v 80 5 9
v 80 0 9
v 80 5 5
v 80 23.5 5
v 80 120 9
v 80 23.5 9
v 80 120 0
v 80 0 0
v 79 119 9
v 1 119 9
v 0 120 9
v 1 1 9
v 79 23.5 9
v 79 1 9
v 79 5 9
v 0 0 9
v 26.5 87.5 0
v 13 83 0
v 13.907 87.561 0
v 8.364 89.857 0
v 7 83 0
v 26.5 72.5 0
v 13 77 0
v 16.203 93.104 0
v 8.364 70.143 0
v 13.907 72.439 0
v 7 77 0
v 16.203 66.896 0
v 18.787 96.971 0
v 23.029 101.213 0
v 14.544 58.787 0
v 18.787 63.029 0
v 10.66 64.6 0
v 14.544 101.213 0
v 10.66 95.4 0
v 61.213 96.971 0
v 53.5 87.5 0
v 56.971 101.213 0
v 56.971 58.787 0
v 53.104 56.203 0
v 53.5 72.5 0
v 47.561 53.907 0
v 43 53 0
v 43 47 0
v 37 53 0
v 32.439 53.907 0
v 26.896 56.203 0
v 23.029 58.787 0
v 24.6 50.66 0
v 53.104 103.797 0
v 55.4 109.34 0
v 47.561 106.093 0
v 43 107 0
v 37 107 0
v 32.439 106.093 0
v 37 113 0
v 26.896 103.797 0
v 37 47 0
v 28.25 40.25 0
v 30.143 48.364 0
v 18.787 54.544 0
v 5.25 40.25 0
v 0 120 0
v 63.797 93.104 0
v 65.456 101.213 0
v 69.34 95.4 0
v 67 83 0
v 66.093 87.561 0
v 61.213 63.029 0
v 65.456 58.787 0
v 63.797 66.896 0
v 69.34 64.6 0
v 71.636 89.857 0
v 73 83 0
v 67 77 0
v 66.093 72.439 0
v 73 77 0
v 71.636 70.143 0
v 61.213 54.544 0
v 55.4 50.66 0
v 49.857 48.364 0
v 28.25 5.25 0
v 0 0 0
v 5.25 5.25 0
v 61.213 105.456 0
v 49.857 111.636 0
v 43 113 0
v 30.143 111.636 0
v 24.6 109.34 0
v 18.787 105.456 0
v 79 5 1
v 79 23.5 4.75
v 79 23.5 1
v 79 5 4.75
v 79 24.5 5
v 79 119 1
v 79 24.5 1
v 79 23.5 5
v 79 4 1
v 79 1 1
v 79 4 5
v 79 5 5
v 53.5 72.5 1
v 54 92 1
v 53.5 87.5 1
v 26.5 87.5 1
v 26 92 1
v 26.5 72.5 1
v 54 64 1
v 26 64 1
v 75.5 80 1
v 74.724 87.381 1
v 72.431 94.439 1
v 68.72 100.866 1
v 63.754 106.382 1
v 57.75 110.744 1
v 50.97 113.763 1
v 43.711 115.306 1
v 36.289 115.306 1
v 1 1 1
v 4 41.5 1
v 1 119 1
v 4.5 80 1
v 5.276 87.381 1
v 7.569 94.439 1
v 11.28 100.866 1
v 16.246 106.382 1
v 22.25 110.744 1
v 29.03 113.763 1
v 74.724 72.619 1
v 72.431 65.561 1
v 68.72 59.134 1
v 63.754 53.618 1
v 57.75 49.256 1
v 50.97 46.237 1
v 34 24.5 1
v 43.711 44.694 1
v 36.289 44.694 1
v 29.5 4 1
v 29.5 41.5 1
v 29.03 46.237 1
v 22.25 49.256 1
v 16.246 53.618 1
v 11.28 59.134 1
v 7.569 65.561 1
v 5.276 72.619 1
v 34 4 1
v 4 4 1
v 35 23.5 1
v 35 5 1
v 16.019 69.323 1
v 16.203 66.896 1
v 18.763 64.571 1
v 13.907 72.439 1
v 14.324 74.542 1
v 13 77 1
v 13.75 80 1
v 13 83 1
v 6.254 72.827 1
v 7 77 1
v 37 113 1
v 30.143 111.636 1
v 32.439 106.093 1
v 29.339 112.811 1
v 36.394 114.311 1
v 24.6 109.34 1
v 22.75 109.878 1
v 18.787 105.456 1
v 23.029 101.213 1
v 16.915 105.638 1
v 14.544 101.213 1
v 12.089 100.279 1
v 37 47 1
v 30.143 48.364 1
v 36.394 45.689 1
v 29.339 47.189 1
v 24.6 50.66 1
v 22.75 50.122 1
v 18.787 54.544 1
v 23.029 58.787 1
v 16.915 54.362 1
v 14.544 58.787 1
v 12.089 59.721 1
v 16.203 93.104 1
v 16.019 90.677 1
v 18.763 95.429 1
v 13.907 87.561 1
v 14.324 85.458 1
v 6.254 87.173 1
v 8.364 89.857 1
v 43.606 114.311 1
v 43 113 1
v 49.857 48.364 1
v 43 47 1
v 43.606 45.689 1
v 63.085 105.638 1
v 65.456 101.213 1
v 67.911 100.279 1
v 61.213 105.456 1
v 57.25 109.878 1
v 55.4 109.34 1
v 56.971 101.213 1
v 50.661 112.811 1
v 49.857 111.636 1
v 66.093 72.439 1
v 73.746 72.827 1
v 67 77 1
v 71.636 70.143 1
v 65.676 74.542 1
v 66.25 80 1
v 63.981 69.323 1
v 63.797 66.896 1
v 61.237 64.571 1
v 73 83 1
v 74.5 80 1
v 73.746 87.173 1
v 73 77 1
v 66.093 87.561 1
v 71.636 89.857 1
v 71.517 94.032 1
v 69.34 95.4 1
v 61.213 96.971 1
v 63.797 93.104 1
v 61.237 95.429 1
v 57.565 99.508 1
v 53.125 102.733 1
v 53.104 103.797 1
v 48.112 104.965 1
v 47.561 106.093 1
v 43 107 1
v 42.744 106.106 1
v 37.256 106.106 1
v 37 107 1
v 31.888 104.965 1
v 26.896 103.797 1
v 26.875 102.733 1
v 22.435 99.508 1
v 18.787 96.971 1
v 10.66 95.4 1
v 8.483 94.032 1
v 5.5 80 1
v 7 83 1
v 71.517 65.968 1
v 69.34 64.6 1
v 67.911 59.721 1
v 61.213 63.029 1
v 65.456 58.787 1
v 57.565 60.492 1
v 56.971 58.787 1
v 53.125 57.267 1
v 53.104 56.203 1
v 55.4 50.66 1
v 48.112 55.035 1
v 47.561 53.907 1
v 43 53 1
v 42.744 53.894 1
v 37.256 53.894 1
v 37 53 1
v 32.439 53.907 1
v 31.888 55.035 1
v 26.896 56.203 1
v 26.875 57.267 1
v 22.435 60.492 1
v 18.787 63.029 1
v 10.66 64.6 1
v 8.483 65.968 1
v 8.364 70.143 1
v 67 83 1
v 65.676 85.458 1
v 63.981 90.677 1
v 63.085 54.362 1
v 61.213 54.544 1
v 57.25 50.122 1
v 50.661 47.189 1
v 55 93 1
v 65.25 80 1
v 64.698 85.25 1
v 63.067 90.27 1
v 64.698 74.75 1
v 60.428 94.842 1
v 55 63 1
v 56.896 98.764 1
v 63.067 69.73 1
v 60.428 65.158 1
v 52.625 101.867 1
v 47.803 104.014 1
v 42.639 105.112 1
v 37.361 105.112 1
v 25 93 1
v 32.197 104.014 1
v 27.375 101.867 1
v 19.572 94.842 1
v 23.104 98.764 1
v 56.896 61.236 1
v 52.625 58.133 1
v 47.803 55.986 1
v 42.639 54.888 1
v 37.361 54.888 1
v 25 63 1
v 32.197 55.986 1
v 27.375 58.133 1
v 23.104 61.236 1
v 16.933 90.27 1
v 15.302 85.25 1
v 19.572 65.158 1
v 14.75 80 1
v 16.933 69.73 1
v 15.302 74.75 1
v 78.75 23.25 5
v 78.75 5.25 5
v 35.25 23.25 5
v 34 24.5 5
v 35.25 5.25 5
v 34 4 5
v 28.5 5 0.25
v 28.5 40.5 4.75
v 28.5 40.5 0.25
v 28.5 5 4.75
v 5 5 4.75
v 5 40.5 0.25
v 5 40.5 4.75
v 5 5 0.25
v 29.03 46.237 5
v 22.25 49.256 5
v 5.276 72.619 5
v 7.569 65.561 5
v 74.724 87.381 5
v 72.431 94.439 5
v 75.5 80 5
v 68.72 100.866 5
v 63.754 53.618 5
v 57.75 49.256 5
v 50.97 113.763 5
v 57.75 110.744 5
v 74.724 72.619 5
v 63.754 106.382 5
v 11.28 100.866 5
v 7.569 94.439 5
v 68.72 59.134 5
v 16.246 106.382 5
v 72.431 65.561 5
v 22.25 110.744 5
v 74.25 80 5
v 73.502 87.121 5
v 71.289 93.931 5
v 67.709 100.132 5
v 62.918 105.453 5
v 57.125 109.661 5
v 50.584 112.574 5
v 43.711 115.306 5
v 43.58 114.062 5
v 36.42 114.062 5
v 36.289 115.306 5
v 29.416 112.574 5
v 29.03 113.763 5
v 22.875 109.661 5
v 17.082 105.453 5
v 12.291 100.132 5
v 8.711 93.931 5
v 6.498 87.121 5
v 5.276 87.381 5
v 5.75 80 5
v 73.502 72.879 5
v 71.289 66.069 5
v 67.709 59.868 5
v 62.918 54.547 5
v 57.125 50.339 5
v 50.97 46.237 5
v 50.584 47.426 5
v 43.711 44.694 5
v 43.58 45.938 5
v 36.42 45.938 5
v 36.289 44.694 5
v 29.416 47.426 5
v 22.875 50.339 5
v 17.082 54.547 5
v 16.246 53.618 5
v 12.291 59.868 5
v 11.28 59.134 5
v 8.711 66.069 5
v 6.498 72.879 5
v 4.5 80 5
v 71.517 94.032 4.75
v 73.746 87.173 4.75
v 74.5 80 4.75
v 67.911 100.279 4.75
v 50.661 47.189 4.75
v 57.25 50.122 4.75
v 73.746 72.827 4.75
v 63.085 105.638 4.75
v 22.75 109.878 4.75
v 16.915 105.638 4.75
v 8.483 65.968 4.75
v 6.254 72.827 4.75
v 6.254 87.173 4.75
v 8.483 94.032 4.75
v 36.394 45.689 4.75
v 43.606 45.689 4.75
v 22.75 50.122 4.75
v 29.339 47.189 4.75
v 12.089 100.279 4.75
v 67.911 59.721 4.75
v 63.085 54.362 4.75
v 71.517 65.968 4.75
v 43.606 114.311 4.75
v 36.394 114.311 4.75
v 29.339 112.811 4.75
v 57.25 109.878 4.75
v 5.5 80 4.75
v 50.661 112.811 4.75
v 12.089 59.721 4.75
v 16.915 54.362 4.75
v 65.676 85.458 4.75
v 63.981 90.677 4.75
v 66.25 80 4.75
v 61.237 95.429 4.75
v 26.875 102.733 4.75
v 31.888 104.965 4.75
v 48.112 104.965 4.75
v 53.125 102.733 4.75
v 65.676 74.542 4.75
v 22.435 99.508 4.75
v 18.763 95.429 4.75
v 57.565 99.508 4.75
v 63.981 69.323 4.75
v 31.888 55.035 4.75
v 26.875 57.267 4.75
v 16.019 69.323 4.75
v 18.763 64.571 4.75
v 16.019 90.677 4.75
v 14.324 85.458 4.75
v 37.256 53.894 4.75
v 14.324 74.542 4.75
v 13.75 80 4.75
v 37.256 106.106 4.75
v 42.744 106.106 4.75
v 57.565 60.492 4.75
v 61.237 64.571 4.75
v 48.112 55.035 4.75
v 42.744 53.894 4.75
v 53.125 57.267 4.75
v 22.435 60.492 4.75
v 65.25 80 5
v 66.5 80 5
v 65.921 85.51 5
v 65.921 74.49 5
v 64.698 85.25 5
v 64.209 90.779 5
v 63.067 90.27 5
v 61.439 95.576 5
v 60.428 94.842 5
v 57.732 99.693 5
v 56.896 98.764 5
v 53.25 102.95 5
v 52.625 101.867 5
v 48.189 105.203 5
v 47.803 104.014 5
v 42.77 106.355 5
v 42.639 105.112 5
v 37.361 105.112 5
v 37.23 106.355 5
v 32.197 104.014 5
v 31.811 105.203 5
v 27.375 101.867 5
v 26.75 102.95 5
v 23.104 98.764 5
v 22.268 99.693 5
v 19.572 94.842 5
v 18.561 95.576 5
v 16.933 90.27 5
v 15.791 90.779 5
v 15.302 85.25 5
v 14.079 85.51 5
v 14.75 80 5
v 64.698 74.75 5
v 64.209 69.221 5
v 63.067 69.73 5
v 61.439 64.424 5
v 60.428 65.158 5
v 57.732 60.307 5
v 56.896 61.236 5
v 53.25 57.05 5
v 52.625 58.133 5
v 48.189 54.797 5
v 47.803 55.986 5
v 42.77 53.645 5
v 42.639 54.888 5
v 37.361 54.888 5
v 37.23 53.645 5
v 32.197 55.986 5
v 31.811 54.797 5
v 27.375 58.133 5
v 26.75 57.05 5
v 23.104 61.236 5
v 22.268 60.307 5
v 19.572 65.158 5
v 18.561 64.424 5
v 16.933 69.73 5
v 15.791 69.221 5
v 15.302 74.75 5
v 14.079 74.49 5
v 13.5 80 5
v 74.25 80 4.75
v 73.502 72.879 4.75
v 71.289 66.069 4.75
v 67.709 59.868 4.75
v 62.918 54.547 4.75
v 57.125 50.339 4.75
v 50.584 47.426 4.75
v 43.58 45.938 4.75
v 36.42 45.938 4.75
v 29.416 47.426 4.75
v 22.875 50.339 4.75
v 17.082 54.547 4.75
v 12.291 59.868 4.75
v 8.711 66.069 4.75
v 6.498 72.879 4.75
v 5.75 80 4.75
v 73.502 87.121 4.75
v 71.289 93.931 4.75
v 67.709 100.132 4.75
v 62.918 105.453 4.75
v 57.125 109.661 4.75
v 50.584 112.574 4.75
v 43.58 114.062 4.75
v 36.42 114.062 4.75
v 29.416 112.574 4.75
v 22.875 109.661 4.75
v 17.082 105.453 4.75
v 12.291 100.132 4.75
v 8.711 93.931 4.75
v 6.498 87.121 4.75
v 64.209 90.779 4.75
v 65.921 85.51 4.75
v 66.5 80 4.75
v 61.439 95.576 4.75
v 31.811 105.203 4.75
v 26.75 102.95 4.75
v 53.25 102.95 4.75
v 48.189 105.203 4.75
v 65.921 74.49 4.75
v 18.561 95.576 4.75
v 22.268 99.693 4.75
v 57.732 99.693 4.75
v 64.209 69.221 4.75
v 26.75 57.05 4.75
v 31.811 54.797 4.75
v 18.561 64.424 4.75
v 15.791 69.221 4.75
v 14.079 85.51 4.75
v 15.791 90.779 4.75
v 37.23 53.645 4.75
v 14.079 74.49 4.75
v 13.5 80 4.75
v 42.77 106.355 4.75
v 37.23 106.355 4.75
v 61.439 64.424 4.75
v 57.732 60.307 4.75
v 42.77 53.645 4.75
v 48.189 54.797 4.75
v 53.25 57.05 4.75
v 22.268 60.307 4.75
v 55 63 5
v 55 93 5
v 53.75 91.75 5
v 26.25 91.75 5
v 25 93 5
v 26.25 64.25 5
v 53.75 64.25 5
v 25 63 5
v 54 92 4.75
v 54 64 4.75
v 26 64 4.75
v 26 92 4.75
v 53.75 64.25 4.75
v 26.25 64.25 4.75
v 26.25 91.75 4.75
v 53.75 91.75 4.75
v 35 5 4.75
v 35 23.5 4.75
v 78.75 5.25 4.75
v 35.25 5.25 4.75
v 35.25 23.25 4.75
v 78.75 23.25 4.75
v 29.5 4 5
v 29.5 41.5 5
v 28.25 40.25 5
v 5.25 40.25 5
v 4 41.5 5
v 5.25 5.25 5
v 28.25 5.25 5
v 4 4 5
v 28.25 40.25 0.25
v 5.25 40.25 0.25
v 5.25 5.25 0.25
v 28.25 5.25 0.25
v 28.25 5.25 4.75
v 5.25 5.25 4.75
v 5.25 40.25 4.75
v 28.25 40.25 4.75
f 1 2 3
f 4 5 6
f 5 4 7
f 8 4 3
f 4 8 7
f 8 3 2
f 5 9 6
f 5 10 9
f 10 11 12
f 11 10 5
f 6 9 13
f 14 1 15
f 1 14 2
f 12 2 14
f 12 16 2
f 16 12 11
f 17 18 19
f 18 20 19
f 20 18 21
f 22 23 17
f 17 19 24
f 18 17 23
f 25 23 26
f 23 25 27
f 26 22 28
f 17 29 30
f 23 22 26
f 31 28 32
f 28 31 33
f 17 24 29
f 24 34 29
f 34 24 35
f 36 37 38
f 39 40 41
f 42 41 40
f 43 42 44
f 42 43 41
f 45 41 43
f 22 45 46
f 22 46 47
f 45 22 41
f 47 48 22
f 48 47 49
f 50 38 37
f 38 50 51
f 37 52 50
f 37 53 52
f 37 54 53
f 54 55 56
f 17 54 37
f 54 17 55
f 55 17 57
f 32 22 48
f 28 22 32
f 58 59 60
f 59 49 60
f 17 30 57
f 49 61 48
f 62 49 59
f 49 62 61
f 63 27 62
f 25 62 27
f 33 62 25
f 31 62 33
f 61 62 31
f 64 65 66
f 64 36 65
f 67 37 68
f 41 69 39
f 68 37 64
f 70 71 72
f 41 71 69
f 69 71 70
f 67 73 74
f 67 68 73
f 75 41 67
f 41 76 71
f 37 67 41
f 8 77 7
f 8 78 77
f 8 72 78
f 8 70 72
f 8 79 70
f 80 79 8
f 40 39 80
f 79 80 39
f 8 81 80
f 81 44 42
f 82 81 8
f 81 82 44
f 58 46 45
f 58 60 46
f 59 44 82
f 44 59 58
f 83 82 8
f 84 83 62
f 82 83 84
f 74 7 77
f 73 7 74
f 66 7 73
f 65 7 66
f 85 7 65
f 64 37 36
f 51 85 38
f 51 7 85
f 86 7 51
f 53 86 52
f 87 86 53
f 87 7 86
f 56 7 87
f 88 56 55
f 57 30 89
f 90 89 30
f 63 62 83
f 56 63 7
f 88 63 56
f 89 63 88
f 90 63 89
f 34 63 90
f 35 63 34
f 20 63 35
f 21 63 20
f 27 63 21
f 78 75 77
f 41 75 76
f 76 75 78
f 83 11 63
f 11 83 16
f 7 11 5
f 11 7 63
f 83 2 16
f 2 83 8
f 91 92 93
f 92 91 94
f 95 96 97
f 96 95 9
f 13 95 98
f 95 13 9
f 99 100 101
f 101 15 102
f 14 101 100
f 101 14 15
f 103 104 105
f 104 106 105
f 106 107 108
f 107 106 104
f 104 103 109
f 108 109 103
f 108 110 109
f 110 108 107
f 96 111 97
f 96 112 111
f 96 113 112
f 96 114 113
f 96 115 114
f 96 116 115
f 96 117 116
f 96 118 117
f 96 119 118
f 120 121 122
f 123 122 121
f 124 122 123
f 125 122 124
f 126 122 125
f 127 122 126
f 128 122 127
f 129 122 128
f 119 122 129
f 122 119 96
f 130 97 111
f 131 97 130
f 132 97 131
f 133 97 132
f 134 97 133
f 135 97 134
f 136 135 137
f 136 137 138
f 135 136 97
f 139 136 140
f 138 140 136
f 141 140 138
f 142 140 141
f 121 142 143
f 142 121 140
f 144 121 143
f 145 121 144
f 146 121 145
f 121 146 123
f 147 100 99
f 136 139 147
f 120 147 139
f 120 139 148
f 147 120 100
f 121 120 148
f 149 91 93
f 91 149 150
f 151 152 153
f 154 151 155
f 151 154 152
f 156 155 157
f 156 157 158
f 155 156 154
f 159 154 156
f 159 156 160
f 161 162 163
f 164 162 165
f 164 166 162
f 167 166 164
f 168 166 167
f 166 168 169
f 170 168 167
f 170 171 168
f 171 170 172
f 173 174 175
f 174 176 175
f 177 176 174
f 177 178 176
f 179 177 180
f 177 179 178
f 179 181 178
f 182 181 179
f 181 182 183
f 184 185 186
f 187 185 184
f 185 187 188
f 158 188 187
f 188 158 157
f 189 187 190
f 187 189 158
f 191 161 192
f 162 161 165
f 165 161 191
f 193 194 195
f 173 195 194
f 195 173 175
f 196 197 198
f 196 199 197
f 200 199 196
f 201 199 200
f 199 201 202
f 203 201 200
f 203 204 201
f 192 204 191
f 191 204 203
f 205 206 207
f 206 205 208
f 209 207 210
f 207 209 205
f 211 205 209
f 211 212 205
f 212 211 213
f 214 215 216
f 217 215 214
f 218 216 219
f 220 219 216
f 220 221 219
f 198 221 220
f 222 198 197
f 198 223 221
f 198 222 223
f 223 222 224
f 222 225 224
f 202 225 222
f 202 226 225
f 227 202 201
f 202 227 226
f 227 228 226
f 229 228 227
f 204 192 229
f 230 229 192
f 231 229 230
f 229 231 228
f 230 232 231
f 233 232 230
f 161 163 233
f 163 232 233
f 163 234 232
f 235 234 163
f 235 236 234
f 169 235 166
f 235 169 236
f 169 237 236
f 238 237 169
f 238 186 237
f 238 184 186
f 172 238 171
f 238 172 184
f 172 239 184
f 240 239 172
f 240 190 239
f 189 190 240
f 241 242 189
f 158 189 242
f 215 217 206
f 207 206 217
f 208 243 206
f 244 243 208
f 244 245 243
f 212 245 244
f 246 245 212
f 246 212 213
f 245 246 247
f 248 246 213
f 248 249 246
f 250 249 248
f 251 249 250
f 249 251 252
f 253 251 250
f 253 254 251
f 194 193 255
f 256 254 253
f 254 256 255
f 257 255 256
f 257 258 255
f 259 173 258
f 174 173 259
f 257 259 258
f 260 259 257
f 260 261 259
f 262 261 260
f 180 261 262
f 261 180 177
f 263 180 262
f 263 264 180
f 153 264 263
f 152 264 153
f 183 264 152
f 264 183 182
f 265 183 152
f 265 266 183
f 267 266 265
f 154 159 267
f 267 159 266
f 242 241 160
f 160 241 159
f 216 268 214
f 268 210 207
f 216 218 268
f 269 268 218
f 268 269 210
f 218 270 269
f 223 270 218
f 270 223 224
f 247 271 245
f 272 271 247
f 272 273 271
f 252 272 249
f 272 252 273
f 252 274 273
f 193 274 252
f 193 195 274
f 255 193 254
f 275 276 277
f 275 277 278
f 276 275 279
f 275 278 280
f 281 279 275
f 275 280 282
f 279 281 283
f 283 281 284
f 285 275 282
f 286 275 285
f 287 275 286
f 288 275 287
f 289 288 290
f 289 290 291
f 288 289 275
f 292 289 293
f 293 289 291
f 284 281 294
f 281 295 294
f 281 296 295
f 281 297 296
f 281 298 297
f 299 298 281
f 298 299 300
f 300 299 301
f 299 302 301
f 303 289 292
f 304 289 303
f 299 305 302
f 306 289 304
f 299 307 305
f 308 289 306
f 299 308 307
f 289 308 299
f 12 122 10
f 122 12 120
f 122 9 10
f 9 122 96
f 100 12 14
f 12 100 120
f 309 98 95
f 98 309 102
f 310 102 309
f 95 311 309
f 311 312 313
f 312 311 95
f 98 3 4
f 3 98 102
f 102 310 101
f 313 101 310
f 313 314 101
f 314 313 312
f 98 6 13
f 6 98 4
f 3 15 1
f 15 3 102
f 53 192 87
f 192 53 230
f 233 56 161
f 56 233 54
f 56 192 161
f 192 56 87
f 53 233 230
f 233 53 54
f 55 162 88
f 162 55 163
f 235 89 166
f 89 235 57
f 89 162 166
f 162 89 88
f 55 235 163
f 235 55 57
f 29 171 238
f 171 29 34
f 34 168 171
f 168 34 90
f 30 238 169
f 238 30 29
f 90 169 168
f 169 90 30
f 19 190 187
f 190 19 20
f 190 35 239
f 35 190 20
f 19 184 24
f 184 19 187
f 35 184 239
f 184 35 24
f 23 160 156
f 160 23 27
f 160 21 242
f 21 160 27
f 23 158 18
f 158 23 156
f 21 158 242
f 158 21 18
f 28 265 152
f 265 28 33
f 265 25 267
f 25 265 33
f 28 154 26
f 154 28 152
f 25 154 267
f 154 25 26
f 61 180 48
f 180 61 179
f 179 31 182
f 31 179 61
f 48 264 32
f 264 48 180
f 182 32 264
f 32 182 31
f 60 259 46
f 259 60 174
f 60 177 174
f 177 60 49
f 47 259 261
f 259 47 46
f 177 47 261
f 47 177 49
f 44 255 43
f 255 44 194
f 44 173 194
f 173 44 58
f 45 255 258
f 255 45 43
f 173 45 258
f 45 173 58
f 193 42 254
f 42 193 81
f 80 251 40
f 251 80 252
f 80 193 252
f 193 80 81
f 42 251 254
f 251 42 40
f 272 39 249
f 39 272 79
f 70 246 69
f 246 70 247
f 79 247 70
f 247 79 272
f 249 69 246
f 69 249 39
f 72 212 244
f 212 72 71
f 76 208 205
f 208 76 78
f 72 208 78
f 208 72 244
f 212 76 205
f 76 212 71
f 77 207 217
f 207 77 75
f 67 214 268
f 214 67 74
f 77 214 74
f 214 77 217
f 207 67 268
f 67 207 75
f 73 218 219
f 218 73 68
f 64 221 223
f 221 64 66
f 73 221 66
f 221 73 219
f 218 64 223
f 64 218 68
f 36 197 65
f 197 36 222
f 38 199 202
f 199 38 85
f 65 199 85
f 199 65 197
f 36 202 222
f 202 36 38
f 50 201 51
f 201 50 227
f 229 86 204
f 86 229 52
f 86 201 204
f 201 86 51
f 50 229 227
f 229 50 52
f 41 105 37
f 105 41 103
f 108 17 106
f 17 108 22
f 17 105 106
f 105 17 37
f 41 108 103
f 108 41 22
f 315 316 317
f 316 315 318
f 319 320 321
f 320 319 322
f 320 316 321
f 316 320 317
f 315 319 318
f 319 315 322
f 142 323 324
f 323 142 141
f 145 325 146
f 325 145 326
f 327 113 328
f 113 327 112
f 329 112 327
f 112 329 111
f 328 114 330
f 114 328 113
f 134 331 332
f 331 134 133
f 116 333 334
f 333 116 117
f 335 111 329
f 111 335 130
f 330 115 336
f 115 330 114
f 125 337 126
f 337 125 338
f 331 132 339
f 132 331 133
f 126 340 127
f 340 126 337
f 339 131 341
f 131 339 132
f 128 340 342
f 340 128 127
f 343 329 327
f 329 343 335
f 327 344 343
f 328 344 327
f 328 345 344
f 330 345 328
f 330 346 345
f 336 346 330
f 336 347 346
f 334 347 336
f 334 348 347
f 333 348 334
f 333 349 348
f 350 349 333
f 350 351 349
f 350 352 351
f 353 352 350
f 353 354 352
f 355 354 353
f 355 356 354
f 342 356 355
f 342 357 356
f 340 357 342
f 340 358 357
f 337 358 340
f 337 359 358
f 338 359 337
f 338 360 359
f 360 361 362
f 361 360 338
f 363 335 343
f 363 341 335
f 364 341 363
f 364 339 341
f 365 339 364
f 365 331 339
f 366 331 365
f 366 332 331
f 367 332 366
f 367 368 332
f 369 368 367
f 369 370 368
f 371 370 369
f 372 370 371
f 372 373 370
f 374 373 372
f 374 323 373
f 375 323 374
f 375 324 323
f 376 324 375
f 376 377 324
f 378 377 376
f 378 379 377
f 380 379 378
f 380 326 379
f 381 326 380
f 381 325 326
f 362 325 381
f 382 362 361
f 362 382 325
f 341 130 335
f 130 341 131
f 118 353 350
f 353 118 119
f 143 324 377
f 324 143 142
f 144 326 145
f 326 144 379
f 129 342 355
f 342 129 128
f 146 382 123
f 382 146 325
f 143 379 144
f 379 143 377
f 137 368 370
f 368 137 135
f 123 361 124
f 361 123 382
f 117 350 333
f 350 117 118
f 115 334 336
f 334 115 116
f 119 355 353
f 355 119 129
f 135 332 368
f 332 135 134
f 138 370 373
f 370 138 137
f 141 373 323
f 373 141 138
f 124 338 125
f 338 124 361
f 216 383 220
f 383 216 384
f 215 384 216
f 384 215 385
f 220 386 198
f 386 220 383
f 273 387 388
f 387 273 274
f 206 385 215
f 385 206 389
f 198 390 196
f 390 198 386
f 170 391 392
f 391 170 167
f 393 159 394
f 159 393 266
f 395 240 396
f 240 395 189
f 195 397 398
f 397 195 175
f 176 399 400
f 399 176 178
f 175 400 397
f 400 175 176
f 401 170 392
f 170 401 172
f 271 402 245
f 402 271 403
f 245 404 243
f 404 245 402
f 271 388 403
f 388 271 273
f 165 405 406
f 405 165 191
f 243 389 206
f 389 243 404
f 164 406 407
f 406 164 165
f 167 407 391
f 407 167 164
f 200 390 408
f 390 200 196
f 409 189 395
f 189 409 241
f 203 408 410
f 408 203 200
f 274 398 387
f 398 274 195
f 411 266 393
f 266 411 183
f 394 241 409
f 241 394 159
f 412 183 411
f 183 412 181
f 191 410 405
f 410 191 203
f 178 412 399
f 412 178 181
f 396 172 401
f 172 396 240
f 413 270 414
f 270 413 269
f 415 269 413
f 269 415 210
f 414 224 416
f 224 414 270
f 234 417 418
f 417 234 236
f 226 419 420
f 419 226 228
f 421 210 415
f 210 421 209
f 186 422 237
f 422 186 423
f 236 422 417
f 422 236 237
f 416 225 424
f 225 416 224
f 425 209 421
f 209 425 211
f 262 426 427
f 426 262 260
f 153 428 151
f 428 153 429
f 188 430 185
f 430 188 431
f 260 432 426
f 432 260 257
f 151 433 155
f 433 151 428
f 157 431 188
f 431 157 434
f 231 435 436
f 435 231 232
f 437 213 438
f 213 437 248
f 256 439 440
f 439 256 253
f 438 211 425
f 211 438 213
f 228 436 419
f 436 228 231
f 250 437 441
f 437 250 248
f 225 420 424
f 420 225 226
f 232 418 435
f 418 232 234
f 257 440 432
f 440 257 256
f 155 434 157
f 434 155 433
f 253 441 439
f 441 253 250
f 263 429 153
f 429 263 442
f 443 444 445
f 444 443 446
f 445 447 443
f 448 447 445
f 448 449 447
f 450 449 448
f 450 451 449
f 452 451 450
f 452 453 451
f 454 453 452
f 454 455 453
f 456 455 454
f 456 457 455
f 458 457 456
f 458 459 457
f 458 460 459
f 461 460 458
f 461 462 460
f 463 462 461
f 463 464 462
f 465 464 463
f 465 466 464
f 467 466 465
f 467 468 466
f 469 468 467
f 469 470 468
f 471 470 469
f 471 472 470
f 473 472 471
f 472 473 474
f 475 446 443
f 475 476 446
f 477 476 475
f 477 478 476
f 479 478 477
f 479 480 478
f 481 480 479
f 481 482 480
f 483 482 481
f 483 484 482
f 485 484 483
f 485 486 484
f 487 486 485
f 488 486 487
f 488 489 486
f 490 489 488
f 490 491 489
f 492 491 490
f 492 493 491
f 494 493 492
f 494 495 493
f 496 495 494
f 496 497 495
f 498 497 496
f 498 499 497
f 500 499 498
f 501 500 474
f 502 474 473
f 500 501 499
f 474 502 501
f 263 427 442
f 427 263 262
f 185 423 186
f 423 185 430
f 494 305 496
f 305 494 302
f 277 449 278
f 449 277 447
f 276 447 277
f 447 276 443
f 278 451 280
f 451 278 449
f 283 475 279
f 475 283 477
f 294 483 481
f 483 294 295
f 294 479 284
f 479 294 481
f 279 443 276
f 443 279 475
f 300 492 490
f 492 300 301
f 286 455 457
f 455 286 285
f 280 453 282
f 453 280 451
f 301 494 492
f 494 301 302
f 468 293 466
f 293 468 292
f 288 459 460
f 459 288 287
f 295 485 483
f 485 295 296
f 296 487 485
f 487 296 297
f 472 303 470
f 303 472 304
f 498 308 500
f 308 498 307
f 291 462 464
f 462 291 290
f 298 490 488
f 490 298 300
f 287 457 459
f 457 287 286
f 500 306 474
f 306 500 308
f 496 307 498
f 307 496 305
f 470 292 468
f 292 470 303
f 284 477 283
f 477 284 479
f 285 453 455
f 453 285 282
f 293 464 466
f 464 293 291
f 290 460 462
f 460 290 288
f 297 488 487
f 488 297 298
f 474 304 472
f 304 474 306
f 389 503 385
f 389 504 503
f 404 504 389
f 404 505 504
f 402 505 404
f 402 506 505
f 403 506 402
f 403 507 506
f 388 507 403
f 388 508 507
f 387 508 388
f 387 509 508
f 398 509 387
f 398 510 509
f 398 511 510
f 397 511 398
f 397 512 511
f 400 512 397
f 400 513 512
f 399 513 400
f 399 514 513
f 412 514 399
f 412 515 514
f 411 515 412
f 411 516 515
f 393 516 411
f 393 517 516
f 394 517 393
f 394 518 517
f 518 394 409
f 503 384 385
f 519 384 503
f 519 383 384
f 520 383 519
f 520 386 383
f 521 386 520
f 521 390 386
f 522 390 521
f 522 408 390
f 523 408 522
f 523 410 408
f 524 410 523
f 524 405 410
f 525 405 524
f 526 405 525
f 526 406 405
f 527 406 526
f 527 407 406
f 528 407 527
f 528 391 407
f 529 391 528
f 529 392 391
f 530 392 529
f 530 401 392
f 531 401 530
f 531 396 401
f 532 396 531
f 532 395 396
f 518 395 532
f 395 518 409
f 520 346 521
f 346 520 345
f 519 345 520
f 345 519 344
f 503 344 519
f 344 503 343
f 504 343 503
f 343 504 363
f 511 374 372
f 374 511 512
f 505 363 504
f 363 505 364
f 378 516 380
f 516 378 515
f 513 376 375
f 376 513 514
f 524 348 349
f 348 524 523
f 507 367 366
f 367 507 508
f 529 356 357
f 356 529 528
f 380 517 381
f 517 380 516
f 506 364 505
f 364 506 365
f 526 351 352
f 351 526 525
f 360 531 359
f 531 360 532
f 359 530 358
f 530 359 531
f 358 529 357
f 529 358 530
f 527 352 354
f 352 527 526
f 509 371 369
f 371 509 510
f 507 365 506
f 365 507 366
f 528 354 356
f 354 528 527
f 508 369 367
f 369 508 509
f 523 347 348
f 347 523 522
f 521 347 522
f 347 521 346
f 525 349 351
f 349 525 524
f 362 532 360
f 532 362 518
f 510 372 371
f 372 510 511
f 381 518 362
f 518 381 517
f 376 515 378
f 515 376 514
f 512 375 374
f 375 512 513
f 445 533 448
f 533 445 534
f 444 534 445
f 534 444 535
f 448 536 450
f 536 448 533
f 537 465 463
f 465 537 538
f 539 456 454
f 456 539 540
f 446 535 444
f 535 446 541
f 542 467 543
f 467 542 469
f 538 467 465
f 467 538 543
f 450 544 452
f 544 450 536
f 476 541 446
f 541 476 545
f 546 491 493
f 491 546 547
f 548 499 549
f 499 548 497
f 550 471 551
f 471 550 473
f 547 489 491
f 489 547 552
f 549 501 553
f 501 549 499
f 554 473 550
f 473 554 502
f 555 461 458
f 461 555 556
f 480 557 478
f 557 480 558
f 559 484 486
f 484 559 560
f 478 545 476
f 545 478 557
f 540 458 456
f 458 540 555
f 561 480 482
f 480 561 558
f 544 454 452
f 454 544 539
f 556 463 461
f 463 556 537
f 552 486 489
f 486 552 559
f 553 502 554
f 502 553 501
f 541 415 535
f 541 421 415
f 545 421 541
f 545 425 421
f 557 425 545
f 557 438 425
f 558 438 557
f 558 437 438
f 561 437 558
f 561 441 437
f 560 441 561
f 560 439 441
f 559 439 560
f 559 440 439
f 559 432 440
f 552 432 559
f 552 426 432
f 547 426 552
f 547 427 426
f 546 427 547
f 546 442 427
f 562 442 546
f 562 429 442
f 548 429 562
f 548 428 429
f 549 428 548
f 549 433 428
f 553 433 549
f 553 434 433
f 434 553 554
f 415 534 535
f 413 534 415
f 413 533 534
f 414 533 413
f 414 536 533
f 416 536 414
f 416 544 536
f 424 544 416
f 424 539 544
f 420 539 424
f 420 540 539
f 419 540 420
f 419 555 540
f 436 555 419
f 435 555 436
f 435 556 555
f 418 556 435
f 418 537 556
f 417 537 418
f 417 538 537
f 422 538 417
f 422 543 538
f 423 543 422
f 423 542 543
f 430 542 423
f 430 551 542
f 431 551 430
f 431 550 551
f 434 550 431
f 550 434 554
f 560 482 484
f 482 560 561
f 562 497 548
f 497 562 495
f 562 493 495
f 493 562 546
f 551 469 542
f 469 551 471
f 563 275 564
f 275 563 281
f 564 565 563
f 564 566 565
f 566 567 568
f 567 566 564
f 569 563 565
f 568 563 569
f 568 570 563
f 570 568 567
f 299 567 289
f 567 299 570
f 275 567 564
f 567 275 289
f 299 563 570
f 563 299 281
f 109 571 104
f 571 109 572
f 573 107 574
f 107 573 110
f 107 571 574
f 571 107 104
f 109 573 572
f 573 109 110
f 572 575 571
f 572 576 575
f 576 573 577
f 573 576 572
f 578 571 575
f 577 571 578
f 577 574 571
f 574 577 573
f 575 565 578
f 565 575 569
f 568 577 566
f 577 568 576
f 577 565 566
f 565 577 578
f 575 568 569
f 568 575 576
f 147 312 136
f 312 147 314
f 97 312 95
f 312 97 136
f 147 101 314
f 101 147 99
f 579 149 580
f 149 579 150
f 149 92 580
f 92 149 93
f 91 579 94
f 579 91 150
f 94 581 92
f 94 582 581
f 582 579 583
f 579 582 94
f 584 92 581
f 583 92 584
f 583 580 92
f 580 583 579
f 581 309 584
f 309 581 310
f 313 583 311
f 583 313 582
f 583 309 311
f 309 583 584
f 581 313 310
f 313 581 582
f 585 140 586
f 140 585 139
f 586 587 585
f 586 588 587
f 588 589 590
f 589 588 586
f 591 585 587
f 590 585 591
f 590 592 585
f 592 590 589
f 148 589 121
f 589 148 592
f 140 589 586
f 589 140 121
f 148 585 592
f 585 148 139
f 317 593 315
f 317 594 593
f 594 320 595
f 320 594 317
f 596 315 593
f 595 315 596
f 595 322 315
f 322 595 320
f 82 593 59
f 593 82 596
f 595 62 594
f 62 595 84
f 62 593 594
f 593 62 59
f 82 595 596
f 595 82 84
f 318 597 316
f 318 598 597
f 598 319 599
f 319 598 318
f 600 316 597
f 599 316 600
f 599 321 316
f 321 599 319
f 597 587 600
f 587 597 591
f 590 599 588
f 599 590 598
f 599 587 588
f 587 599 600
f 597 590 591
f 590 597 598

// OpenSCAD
//$fn = 180;

plateWidth = 80;
plateLength = 120;
plateHeight = 1;

circleRadius = 30;
ledLength = 6;


controllerLength = 18.5; // Nano


module plate()
{
    h = 8;
    
    difference()
    {
        cube([plateWidth, plateLength, plateHeight+h]);
        translate([1, 1, plateHeight]) cube([plateWidth-2, plateLength-2, h]);
        translate([plateWidth-2, 5, 5]) cube([2, controllerLength, 4]);
    }
}

module led()
{
    numberLed = 16;

    translate([plateWidth/2, plateLength-plateWidth/2, 0]) for (i = [0:360/numberLed:360]) 
        rotate([0, 0, i]) translate([0, circleRadius, plateHeight/2]) cube([ledLength, ledLength, plateHeight], true);
}

module display()
{
    w = 27;
    l = 15;
    
    translate([plateWidth/2, plateLength-plateWidth/2, plateHeight/2]) cube([w, l, plateHeight], true);
}

module sensor()
{
    w = 23.5;
    l = 35.5;
    
    translate([5, 5, 0]) cube([w, l, plateHeight]);
}

module ledHolder()
{
    height = 4;

    translate([plateWidth/2, plateLength-plateWidth/2, plateHeight])
    {
        difference()
        {
            cylinder(h = height, r = circleRadius+ledLength/2+2.5);
            cylinder(h = height, r = circleRadius+ledLength/2+1.5);
        }

        difference()
        {
            cylinder(h = height, r = circleRadius-ledLength/2-0.75);
            cylinder(h = height, r = circleRadius-ledLength/2-1.75);
        }
        
        translate([0, 0, height-0.25]) difference()
        {
            cylinder(h = 0.25, r = circleRadius+ledLength/2+1.5);
            cylinder(h = 0.25, r = circleRadius+ledLength/2+1.25);
        }

        translate([0, 0, height-0.25]) difference()
        {
            cylinder(h = 0.25, r = circleRadius-ledLength/2-0.5);
            cylinder(h = 0.25, r = circleRadius-ledLength/2-0.75);
        }
    }    
    
}

module displayHolder()
{
    w = 28;
    l = 28;
    height = 4;

    translate([plateWidth/2, plateLength-plateWidth/2-2, plateHeight+height/2]) difference()
    {
        cube([w+2, l+2, height], true);
        cube([w, l, height], true);
    }
    
    translate([plateWidth/2, plateLength-plateWidth/2-2, plateHeight+height-0.25/2]) difference()
    {
        cube([w, l, 0.25], true);
        cube([w-0.5, l-0.5, 0.25], true);
    }

}

module controllHolderNano()
{
    w = 44;
    l = controllerLength;
    height = 4;
    xPos = plateWidth-w-2;
    yPos = 4;

    translate([w/2+1+xPos, l/2+1+yPos, plateHeight+height/2]) difference()
    {
        cube([w+2, l+2, height], true);
        cube([w, l, height], true);
    }
    
    translate([w/2+1+xPos, l/2+1+yPos, plateHeight+height-0.25/2]) difference()
    {
        cube([w, l, 0.25], true);
        cube([w-0.5, l-0.5, 0.25], true);
    }

}

module sensorHolder()
{
    w = 23.5;
    l = 35.5;
    height = 4;
    xPos = 4;
    yPos = 4;

    translate([w/2+1+xPos, l/2+1+yPos, plateHeight+height/2]) difference()
    {
        cube([w+2, l+2, height], true);
        cube([w, l, height], true);
    }
    
    translate([w/2+1+xPos, l/2+1+yPos, 0.25/2]) difference()
    {
        cube([w, l, 0.25], true);
        cube([w-0.5, l-0.5, 0.25], true);
    }

    translate([w/2+1+xPos, l/2+1+yPos, plateHeight+height-0.25/2]) difference()
    {
        cube([w, l, 0.25], true);
        cube([w-0.5, l-0.5, 0.25],true);
    }
}


difference()
{
    plate();
    led();
    display();
    sensor();
}

ledHolder();
displayHolder();
controllHolderNano();
sensorHolder();
